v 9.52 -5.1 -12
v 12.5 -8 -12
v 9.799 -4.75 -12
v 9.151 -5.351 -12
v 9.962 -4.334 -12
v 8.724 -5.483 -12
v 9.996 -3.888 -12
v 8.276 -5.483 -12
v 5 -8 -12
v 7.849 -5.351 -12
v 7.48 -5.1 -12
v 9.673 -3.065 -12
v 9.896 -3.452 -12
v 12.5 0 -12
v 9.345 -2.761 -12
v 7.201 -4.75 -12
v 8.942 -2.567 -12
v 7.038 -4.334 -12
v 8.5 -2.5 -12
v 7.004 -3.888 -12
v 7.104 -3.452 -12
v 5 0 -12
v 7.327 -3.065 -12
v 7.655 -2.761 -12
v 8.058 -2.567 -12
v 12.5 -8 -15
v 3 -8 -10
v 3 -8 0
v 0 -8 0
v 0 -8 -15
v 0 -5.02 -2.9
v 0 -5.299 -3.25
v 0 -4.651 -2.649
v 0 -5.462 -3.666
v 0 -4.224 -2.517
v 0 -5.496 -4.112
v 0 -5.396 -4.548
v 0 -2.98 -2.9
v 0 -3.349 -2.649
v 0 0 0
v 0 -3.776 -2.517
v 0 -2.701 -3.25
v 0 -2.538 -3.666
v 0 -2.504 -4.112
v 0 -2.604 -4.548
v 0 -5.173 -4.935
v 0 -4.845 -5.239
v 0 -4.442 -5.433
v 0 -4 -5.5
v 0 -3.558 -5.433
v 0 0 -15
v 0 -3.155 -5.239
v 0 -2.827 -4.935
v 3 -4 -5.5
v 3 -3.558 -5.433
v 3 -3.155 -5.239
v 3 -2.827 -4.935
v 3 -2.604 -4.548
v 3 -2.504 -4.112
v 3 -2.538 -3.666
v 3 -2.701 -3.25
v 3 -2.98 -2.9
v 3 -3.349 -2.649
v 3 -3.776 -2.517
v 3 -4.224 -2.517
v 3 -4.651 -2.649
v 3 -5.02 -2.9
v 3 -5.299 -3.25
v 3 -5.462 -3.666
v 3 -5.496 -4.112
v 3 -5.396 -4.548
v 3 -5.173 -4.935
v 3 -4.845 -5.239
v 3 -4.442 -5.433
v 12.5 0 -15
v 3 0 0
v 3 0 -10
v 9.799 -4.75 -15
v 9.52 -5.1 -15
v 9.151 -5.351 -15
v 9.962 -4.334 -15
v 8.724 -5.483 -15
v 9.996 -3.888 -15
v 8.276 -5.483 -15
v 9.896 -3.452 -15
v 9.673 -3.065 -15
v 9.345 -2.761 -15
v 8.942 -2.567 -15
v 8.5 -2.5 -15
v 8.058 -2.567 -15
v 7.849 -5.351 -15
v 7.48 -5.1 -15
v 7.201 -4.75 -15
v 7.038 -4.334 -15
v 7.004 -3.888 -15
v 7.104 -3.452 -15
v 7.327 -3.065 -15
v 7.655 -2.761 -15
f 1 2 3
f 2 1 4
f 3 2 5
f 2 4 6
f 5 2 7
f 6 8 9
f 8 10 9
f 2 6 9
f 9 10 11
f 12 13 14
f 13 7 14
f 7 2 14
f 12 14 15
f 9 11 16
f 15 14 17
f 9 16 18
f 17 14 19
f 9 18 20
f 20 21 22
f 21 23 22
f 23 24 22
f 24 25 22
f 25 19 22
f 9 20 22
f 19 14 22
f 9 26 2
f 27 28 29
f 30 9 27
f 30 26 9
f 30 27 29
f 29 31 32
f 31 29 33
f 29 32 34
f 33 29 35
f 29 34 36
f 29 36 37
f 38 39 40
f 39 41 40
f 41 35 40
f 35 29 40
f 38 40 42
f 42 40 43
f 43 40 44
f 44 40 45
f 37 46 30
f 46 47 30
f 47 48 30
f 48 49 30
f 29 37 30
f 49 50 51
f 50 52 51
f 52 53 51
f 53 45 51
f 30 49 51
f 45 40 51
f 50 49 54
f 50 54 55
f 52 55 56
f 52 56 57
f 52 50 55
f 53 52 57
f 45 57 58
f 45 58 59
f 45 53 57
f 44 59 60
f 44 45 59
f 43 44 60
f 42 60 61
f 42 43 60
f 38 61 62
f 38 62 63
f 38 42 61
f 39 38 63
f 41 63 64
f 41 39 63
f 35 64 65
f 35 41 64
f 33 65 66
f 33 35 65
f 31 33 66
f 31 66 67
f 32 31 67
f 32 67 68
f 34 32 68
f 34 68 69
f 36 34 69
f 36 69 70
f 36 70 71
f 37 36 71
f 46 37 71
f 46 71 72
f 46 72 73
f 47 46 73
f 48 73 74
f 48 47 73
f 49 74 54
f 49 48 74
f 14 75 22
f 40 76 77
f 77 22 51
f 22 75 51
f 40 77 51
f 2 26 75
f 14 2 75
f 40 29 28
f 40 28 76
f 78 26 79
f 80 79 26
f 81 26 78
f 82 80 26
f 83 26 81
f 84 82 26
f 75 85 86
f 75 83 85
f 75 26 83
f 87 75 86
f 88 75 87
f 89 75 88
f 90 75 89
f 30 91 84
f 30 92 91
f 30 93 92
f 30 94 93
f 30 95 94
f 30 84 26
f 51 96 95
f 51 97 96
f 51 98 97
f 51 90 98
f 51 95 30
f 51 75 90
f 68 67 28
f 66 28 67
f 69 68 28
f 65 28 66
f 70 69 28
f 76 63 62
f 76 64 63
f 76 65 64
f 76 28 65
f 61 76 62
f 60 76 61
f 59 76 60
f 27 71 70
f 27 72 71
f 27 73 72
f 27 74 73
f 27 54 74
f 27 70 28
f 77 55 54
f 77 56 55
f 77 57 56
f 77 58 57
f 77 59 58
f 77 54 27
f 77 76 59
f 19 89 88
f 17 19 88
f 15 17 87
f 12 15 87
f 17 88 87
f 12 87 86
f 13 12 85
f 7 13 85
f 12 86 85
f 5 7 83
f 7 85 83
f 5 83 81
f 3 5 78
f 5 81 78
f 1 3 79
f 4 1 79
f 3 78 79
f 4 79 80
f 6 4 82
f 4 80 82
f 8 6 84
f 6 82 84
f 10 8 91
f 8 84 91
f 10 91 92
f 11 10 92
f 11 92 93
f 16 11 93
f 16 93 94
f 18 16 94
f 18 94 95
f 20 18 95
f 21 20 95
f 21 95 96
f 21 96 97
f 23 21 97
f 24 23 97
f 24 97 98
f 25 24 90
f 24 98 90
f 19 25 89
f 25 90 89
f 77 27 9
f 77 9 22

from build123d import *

# Parameters (mm, degrees)
SKETCH1_W           = 15
SKETCH1_H           = 8
SKETCH1_R           = 1.5
BOSS_EXTRUDE1_DEPTH = 3
SKETCH2_W           = 12.5
SKETCH2_H           = 8
SKETCH2_R           = 1.5
BOSS_EXTRUDE2_DEPTH = 3
CHAMFER1_SIZE       = 2


with BuildPart() as part:
    # Sketch1 → Boss-Extrude1 (new body)
    with BuildSketch(Plane(origin=(0, 0, 0), x_dir=(0, 0, -1), z_dir=(1, 0, 0))):
        with Locations((7.5, -4)):
            Rectangle(SKETCH1_W, SKETCH1_H)
        with Locations((4, -4)):
            Circle(SKETCH1_R, mode=Mode.SUBTRACT)
    extrude(amount=BOSS_EXTRUDE1_DEPTH)

    # Sketch2 → Boss-Extrude2 (add)
    with BuildSketch(Plane(origin=(0, 0, -15), x_dir=(-1, 0, 0), z_dir=(0, 0, -1))):
        with Locations((-6.25, -4)):
            Rectangle(SKETCH2_W, SKETCH2_H)
        with Locations(Location((-8.5, -4, 0), (0, 0, 90))):
            Circle(SKETCH2_R, mode=Mode.SUBTRACT)
    extrude(amount=-BOSS_EXTRUDE2_DEPTH)

    # Chamfer1
    chamfer1_edges = [part.edges().sort_by_distance(p)[0] for p in [
        (3, -4, -12),
    ]]
    chamfer(chamfer1_edges, length=CHAMFER1_SIZE)


solid = part.part
